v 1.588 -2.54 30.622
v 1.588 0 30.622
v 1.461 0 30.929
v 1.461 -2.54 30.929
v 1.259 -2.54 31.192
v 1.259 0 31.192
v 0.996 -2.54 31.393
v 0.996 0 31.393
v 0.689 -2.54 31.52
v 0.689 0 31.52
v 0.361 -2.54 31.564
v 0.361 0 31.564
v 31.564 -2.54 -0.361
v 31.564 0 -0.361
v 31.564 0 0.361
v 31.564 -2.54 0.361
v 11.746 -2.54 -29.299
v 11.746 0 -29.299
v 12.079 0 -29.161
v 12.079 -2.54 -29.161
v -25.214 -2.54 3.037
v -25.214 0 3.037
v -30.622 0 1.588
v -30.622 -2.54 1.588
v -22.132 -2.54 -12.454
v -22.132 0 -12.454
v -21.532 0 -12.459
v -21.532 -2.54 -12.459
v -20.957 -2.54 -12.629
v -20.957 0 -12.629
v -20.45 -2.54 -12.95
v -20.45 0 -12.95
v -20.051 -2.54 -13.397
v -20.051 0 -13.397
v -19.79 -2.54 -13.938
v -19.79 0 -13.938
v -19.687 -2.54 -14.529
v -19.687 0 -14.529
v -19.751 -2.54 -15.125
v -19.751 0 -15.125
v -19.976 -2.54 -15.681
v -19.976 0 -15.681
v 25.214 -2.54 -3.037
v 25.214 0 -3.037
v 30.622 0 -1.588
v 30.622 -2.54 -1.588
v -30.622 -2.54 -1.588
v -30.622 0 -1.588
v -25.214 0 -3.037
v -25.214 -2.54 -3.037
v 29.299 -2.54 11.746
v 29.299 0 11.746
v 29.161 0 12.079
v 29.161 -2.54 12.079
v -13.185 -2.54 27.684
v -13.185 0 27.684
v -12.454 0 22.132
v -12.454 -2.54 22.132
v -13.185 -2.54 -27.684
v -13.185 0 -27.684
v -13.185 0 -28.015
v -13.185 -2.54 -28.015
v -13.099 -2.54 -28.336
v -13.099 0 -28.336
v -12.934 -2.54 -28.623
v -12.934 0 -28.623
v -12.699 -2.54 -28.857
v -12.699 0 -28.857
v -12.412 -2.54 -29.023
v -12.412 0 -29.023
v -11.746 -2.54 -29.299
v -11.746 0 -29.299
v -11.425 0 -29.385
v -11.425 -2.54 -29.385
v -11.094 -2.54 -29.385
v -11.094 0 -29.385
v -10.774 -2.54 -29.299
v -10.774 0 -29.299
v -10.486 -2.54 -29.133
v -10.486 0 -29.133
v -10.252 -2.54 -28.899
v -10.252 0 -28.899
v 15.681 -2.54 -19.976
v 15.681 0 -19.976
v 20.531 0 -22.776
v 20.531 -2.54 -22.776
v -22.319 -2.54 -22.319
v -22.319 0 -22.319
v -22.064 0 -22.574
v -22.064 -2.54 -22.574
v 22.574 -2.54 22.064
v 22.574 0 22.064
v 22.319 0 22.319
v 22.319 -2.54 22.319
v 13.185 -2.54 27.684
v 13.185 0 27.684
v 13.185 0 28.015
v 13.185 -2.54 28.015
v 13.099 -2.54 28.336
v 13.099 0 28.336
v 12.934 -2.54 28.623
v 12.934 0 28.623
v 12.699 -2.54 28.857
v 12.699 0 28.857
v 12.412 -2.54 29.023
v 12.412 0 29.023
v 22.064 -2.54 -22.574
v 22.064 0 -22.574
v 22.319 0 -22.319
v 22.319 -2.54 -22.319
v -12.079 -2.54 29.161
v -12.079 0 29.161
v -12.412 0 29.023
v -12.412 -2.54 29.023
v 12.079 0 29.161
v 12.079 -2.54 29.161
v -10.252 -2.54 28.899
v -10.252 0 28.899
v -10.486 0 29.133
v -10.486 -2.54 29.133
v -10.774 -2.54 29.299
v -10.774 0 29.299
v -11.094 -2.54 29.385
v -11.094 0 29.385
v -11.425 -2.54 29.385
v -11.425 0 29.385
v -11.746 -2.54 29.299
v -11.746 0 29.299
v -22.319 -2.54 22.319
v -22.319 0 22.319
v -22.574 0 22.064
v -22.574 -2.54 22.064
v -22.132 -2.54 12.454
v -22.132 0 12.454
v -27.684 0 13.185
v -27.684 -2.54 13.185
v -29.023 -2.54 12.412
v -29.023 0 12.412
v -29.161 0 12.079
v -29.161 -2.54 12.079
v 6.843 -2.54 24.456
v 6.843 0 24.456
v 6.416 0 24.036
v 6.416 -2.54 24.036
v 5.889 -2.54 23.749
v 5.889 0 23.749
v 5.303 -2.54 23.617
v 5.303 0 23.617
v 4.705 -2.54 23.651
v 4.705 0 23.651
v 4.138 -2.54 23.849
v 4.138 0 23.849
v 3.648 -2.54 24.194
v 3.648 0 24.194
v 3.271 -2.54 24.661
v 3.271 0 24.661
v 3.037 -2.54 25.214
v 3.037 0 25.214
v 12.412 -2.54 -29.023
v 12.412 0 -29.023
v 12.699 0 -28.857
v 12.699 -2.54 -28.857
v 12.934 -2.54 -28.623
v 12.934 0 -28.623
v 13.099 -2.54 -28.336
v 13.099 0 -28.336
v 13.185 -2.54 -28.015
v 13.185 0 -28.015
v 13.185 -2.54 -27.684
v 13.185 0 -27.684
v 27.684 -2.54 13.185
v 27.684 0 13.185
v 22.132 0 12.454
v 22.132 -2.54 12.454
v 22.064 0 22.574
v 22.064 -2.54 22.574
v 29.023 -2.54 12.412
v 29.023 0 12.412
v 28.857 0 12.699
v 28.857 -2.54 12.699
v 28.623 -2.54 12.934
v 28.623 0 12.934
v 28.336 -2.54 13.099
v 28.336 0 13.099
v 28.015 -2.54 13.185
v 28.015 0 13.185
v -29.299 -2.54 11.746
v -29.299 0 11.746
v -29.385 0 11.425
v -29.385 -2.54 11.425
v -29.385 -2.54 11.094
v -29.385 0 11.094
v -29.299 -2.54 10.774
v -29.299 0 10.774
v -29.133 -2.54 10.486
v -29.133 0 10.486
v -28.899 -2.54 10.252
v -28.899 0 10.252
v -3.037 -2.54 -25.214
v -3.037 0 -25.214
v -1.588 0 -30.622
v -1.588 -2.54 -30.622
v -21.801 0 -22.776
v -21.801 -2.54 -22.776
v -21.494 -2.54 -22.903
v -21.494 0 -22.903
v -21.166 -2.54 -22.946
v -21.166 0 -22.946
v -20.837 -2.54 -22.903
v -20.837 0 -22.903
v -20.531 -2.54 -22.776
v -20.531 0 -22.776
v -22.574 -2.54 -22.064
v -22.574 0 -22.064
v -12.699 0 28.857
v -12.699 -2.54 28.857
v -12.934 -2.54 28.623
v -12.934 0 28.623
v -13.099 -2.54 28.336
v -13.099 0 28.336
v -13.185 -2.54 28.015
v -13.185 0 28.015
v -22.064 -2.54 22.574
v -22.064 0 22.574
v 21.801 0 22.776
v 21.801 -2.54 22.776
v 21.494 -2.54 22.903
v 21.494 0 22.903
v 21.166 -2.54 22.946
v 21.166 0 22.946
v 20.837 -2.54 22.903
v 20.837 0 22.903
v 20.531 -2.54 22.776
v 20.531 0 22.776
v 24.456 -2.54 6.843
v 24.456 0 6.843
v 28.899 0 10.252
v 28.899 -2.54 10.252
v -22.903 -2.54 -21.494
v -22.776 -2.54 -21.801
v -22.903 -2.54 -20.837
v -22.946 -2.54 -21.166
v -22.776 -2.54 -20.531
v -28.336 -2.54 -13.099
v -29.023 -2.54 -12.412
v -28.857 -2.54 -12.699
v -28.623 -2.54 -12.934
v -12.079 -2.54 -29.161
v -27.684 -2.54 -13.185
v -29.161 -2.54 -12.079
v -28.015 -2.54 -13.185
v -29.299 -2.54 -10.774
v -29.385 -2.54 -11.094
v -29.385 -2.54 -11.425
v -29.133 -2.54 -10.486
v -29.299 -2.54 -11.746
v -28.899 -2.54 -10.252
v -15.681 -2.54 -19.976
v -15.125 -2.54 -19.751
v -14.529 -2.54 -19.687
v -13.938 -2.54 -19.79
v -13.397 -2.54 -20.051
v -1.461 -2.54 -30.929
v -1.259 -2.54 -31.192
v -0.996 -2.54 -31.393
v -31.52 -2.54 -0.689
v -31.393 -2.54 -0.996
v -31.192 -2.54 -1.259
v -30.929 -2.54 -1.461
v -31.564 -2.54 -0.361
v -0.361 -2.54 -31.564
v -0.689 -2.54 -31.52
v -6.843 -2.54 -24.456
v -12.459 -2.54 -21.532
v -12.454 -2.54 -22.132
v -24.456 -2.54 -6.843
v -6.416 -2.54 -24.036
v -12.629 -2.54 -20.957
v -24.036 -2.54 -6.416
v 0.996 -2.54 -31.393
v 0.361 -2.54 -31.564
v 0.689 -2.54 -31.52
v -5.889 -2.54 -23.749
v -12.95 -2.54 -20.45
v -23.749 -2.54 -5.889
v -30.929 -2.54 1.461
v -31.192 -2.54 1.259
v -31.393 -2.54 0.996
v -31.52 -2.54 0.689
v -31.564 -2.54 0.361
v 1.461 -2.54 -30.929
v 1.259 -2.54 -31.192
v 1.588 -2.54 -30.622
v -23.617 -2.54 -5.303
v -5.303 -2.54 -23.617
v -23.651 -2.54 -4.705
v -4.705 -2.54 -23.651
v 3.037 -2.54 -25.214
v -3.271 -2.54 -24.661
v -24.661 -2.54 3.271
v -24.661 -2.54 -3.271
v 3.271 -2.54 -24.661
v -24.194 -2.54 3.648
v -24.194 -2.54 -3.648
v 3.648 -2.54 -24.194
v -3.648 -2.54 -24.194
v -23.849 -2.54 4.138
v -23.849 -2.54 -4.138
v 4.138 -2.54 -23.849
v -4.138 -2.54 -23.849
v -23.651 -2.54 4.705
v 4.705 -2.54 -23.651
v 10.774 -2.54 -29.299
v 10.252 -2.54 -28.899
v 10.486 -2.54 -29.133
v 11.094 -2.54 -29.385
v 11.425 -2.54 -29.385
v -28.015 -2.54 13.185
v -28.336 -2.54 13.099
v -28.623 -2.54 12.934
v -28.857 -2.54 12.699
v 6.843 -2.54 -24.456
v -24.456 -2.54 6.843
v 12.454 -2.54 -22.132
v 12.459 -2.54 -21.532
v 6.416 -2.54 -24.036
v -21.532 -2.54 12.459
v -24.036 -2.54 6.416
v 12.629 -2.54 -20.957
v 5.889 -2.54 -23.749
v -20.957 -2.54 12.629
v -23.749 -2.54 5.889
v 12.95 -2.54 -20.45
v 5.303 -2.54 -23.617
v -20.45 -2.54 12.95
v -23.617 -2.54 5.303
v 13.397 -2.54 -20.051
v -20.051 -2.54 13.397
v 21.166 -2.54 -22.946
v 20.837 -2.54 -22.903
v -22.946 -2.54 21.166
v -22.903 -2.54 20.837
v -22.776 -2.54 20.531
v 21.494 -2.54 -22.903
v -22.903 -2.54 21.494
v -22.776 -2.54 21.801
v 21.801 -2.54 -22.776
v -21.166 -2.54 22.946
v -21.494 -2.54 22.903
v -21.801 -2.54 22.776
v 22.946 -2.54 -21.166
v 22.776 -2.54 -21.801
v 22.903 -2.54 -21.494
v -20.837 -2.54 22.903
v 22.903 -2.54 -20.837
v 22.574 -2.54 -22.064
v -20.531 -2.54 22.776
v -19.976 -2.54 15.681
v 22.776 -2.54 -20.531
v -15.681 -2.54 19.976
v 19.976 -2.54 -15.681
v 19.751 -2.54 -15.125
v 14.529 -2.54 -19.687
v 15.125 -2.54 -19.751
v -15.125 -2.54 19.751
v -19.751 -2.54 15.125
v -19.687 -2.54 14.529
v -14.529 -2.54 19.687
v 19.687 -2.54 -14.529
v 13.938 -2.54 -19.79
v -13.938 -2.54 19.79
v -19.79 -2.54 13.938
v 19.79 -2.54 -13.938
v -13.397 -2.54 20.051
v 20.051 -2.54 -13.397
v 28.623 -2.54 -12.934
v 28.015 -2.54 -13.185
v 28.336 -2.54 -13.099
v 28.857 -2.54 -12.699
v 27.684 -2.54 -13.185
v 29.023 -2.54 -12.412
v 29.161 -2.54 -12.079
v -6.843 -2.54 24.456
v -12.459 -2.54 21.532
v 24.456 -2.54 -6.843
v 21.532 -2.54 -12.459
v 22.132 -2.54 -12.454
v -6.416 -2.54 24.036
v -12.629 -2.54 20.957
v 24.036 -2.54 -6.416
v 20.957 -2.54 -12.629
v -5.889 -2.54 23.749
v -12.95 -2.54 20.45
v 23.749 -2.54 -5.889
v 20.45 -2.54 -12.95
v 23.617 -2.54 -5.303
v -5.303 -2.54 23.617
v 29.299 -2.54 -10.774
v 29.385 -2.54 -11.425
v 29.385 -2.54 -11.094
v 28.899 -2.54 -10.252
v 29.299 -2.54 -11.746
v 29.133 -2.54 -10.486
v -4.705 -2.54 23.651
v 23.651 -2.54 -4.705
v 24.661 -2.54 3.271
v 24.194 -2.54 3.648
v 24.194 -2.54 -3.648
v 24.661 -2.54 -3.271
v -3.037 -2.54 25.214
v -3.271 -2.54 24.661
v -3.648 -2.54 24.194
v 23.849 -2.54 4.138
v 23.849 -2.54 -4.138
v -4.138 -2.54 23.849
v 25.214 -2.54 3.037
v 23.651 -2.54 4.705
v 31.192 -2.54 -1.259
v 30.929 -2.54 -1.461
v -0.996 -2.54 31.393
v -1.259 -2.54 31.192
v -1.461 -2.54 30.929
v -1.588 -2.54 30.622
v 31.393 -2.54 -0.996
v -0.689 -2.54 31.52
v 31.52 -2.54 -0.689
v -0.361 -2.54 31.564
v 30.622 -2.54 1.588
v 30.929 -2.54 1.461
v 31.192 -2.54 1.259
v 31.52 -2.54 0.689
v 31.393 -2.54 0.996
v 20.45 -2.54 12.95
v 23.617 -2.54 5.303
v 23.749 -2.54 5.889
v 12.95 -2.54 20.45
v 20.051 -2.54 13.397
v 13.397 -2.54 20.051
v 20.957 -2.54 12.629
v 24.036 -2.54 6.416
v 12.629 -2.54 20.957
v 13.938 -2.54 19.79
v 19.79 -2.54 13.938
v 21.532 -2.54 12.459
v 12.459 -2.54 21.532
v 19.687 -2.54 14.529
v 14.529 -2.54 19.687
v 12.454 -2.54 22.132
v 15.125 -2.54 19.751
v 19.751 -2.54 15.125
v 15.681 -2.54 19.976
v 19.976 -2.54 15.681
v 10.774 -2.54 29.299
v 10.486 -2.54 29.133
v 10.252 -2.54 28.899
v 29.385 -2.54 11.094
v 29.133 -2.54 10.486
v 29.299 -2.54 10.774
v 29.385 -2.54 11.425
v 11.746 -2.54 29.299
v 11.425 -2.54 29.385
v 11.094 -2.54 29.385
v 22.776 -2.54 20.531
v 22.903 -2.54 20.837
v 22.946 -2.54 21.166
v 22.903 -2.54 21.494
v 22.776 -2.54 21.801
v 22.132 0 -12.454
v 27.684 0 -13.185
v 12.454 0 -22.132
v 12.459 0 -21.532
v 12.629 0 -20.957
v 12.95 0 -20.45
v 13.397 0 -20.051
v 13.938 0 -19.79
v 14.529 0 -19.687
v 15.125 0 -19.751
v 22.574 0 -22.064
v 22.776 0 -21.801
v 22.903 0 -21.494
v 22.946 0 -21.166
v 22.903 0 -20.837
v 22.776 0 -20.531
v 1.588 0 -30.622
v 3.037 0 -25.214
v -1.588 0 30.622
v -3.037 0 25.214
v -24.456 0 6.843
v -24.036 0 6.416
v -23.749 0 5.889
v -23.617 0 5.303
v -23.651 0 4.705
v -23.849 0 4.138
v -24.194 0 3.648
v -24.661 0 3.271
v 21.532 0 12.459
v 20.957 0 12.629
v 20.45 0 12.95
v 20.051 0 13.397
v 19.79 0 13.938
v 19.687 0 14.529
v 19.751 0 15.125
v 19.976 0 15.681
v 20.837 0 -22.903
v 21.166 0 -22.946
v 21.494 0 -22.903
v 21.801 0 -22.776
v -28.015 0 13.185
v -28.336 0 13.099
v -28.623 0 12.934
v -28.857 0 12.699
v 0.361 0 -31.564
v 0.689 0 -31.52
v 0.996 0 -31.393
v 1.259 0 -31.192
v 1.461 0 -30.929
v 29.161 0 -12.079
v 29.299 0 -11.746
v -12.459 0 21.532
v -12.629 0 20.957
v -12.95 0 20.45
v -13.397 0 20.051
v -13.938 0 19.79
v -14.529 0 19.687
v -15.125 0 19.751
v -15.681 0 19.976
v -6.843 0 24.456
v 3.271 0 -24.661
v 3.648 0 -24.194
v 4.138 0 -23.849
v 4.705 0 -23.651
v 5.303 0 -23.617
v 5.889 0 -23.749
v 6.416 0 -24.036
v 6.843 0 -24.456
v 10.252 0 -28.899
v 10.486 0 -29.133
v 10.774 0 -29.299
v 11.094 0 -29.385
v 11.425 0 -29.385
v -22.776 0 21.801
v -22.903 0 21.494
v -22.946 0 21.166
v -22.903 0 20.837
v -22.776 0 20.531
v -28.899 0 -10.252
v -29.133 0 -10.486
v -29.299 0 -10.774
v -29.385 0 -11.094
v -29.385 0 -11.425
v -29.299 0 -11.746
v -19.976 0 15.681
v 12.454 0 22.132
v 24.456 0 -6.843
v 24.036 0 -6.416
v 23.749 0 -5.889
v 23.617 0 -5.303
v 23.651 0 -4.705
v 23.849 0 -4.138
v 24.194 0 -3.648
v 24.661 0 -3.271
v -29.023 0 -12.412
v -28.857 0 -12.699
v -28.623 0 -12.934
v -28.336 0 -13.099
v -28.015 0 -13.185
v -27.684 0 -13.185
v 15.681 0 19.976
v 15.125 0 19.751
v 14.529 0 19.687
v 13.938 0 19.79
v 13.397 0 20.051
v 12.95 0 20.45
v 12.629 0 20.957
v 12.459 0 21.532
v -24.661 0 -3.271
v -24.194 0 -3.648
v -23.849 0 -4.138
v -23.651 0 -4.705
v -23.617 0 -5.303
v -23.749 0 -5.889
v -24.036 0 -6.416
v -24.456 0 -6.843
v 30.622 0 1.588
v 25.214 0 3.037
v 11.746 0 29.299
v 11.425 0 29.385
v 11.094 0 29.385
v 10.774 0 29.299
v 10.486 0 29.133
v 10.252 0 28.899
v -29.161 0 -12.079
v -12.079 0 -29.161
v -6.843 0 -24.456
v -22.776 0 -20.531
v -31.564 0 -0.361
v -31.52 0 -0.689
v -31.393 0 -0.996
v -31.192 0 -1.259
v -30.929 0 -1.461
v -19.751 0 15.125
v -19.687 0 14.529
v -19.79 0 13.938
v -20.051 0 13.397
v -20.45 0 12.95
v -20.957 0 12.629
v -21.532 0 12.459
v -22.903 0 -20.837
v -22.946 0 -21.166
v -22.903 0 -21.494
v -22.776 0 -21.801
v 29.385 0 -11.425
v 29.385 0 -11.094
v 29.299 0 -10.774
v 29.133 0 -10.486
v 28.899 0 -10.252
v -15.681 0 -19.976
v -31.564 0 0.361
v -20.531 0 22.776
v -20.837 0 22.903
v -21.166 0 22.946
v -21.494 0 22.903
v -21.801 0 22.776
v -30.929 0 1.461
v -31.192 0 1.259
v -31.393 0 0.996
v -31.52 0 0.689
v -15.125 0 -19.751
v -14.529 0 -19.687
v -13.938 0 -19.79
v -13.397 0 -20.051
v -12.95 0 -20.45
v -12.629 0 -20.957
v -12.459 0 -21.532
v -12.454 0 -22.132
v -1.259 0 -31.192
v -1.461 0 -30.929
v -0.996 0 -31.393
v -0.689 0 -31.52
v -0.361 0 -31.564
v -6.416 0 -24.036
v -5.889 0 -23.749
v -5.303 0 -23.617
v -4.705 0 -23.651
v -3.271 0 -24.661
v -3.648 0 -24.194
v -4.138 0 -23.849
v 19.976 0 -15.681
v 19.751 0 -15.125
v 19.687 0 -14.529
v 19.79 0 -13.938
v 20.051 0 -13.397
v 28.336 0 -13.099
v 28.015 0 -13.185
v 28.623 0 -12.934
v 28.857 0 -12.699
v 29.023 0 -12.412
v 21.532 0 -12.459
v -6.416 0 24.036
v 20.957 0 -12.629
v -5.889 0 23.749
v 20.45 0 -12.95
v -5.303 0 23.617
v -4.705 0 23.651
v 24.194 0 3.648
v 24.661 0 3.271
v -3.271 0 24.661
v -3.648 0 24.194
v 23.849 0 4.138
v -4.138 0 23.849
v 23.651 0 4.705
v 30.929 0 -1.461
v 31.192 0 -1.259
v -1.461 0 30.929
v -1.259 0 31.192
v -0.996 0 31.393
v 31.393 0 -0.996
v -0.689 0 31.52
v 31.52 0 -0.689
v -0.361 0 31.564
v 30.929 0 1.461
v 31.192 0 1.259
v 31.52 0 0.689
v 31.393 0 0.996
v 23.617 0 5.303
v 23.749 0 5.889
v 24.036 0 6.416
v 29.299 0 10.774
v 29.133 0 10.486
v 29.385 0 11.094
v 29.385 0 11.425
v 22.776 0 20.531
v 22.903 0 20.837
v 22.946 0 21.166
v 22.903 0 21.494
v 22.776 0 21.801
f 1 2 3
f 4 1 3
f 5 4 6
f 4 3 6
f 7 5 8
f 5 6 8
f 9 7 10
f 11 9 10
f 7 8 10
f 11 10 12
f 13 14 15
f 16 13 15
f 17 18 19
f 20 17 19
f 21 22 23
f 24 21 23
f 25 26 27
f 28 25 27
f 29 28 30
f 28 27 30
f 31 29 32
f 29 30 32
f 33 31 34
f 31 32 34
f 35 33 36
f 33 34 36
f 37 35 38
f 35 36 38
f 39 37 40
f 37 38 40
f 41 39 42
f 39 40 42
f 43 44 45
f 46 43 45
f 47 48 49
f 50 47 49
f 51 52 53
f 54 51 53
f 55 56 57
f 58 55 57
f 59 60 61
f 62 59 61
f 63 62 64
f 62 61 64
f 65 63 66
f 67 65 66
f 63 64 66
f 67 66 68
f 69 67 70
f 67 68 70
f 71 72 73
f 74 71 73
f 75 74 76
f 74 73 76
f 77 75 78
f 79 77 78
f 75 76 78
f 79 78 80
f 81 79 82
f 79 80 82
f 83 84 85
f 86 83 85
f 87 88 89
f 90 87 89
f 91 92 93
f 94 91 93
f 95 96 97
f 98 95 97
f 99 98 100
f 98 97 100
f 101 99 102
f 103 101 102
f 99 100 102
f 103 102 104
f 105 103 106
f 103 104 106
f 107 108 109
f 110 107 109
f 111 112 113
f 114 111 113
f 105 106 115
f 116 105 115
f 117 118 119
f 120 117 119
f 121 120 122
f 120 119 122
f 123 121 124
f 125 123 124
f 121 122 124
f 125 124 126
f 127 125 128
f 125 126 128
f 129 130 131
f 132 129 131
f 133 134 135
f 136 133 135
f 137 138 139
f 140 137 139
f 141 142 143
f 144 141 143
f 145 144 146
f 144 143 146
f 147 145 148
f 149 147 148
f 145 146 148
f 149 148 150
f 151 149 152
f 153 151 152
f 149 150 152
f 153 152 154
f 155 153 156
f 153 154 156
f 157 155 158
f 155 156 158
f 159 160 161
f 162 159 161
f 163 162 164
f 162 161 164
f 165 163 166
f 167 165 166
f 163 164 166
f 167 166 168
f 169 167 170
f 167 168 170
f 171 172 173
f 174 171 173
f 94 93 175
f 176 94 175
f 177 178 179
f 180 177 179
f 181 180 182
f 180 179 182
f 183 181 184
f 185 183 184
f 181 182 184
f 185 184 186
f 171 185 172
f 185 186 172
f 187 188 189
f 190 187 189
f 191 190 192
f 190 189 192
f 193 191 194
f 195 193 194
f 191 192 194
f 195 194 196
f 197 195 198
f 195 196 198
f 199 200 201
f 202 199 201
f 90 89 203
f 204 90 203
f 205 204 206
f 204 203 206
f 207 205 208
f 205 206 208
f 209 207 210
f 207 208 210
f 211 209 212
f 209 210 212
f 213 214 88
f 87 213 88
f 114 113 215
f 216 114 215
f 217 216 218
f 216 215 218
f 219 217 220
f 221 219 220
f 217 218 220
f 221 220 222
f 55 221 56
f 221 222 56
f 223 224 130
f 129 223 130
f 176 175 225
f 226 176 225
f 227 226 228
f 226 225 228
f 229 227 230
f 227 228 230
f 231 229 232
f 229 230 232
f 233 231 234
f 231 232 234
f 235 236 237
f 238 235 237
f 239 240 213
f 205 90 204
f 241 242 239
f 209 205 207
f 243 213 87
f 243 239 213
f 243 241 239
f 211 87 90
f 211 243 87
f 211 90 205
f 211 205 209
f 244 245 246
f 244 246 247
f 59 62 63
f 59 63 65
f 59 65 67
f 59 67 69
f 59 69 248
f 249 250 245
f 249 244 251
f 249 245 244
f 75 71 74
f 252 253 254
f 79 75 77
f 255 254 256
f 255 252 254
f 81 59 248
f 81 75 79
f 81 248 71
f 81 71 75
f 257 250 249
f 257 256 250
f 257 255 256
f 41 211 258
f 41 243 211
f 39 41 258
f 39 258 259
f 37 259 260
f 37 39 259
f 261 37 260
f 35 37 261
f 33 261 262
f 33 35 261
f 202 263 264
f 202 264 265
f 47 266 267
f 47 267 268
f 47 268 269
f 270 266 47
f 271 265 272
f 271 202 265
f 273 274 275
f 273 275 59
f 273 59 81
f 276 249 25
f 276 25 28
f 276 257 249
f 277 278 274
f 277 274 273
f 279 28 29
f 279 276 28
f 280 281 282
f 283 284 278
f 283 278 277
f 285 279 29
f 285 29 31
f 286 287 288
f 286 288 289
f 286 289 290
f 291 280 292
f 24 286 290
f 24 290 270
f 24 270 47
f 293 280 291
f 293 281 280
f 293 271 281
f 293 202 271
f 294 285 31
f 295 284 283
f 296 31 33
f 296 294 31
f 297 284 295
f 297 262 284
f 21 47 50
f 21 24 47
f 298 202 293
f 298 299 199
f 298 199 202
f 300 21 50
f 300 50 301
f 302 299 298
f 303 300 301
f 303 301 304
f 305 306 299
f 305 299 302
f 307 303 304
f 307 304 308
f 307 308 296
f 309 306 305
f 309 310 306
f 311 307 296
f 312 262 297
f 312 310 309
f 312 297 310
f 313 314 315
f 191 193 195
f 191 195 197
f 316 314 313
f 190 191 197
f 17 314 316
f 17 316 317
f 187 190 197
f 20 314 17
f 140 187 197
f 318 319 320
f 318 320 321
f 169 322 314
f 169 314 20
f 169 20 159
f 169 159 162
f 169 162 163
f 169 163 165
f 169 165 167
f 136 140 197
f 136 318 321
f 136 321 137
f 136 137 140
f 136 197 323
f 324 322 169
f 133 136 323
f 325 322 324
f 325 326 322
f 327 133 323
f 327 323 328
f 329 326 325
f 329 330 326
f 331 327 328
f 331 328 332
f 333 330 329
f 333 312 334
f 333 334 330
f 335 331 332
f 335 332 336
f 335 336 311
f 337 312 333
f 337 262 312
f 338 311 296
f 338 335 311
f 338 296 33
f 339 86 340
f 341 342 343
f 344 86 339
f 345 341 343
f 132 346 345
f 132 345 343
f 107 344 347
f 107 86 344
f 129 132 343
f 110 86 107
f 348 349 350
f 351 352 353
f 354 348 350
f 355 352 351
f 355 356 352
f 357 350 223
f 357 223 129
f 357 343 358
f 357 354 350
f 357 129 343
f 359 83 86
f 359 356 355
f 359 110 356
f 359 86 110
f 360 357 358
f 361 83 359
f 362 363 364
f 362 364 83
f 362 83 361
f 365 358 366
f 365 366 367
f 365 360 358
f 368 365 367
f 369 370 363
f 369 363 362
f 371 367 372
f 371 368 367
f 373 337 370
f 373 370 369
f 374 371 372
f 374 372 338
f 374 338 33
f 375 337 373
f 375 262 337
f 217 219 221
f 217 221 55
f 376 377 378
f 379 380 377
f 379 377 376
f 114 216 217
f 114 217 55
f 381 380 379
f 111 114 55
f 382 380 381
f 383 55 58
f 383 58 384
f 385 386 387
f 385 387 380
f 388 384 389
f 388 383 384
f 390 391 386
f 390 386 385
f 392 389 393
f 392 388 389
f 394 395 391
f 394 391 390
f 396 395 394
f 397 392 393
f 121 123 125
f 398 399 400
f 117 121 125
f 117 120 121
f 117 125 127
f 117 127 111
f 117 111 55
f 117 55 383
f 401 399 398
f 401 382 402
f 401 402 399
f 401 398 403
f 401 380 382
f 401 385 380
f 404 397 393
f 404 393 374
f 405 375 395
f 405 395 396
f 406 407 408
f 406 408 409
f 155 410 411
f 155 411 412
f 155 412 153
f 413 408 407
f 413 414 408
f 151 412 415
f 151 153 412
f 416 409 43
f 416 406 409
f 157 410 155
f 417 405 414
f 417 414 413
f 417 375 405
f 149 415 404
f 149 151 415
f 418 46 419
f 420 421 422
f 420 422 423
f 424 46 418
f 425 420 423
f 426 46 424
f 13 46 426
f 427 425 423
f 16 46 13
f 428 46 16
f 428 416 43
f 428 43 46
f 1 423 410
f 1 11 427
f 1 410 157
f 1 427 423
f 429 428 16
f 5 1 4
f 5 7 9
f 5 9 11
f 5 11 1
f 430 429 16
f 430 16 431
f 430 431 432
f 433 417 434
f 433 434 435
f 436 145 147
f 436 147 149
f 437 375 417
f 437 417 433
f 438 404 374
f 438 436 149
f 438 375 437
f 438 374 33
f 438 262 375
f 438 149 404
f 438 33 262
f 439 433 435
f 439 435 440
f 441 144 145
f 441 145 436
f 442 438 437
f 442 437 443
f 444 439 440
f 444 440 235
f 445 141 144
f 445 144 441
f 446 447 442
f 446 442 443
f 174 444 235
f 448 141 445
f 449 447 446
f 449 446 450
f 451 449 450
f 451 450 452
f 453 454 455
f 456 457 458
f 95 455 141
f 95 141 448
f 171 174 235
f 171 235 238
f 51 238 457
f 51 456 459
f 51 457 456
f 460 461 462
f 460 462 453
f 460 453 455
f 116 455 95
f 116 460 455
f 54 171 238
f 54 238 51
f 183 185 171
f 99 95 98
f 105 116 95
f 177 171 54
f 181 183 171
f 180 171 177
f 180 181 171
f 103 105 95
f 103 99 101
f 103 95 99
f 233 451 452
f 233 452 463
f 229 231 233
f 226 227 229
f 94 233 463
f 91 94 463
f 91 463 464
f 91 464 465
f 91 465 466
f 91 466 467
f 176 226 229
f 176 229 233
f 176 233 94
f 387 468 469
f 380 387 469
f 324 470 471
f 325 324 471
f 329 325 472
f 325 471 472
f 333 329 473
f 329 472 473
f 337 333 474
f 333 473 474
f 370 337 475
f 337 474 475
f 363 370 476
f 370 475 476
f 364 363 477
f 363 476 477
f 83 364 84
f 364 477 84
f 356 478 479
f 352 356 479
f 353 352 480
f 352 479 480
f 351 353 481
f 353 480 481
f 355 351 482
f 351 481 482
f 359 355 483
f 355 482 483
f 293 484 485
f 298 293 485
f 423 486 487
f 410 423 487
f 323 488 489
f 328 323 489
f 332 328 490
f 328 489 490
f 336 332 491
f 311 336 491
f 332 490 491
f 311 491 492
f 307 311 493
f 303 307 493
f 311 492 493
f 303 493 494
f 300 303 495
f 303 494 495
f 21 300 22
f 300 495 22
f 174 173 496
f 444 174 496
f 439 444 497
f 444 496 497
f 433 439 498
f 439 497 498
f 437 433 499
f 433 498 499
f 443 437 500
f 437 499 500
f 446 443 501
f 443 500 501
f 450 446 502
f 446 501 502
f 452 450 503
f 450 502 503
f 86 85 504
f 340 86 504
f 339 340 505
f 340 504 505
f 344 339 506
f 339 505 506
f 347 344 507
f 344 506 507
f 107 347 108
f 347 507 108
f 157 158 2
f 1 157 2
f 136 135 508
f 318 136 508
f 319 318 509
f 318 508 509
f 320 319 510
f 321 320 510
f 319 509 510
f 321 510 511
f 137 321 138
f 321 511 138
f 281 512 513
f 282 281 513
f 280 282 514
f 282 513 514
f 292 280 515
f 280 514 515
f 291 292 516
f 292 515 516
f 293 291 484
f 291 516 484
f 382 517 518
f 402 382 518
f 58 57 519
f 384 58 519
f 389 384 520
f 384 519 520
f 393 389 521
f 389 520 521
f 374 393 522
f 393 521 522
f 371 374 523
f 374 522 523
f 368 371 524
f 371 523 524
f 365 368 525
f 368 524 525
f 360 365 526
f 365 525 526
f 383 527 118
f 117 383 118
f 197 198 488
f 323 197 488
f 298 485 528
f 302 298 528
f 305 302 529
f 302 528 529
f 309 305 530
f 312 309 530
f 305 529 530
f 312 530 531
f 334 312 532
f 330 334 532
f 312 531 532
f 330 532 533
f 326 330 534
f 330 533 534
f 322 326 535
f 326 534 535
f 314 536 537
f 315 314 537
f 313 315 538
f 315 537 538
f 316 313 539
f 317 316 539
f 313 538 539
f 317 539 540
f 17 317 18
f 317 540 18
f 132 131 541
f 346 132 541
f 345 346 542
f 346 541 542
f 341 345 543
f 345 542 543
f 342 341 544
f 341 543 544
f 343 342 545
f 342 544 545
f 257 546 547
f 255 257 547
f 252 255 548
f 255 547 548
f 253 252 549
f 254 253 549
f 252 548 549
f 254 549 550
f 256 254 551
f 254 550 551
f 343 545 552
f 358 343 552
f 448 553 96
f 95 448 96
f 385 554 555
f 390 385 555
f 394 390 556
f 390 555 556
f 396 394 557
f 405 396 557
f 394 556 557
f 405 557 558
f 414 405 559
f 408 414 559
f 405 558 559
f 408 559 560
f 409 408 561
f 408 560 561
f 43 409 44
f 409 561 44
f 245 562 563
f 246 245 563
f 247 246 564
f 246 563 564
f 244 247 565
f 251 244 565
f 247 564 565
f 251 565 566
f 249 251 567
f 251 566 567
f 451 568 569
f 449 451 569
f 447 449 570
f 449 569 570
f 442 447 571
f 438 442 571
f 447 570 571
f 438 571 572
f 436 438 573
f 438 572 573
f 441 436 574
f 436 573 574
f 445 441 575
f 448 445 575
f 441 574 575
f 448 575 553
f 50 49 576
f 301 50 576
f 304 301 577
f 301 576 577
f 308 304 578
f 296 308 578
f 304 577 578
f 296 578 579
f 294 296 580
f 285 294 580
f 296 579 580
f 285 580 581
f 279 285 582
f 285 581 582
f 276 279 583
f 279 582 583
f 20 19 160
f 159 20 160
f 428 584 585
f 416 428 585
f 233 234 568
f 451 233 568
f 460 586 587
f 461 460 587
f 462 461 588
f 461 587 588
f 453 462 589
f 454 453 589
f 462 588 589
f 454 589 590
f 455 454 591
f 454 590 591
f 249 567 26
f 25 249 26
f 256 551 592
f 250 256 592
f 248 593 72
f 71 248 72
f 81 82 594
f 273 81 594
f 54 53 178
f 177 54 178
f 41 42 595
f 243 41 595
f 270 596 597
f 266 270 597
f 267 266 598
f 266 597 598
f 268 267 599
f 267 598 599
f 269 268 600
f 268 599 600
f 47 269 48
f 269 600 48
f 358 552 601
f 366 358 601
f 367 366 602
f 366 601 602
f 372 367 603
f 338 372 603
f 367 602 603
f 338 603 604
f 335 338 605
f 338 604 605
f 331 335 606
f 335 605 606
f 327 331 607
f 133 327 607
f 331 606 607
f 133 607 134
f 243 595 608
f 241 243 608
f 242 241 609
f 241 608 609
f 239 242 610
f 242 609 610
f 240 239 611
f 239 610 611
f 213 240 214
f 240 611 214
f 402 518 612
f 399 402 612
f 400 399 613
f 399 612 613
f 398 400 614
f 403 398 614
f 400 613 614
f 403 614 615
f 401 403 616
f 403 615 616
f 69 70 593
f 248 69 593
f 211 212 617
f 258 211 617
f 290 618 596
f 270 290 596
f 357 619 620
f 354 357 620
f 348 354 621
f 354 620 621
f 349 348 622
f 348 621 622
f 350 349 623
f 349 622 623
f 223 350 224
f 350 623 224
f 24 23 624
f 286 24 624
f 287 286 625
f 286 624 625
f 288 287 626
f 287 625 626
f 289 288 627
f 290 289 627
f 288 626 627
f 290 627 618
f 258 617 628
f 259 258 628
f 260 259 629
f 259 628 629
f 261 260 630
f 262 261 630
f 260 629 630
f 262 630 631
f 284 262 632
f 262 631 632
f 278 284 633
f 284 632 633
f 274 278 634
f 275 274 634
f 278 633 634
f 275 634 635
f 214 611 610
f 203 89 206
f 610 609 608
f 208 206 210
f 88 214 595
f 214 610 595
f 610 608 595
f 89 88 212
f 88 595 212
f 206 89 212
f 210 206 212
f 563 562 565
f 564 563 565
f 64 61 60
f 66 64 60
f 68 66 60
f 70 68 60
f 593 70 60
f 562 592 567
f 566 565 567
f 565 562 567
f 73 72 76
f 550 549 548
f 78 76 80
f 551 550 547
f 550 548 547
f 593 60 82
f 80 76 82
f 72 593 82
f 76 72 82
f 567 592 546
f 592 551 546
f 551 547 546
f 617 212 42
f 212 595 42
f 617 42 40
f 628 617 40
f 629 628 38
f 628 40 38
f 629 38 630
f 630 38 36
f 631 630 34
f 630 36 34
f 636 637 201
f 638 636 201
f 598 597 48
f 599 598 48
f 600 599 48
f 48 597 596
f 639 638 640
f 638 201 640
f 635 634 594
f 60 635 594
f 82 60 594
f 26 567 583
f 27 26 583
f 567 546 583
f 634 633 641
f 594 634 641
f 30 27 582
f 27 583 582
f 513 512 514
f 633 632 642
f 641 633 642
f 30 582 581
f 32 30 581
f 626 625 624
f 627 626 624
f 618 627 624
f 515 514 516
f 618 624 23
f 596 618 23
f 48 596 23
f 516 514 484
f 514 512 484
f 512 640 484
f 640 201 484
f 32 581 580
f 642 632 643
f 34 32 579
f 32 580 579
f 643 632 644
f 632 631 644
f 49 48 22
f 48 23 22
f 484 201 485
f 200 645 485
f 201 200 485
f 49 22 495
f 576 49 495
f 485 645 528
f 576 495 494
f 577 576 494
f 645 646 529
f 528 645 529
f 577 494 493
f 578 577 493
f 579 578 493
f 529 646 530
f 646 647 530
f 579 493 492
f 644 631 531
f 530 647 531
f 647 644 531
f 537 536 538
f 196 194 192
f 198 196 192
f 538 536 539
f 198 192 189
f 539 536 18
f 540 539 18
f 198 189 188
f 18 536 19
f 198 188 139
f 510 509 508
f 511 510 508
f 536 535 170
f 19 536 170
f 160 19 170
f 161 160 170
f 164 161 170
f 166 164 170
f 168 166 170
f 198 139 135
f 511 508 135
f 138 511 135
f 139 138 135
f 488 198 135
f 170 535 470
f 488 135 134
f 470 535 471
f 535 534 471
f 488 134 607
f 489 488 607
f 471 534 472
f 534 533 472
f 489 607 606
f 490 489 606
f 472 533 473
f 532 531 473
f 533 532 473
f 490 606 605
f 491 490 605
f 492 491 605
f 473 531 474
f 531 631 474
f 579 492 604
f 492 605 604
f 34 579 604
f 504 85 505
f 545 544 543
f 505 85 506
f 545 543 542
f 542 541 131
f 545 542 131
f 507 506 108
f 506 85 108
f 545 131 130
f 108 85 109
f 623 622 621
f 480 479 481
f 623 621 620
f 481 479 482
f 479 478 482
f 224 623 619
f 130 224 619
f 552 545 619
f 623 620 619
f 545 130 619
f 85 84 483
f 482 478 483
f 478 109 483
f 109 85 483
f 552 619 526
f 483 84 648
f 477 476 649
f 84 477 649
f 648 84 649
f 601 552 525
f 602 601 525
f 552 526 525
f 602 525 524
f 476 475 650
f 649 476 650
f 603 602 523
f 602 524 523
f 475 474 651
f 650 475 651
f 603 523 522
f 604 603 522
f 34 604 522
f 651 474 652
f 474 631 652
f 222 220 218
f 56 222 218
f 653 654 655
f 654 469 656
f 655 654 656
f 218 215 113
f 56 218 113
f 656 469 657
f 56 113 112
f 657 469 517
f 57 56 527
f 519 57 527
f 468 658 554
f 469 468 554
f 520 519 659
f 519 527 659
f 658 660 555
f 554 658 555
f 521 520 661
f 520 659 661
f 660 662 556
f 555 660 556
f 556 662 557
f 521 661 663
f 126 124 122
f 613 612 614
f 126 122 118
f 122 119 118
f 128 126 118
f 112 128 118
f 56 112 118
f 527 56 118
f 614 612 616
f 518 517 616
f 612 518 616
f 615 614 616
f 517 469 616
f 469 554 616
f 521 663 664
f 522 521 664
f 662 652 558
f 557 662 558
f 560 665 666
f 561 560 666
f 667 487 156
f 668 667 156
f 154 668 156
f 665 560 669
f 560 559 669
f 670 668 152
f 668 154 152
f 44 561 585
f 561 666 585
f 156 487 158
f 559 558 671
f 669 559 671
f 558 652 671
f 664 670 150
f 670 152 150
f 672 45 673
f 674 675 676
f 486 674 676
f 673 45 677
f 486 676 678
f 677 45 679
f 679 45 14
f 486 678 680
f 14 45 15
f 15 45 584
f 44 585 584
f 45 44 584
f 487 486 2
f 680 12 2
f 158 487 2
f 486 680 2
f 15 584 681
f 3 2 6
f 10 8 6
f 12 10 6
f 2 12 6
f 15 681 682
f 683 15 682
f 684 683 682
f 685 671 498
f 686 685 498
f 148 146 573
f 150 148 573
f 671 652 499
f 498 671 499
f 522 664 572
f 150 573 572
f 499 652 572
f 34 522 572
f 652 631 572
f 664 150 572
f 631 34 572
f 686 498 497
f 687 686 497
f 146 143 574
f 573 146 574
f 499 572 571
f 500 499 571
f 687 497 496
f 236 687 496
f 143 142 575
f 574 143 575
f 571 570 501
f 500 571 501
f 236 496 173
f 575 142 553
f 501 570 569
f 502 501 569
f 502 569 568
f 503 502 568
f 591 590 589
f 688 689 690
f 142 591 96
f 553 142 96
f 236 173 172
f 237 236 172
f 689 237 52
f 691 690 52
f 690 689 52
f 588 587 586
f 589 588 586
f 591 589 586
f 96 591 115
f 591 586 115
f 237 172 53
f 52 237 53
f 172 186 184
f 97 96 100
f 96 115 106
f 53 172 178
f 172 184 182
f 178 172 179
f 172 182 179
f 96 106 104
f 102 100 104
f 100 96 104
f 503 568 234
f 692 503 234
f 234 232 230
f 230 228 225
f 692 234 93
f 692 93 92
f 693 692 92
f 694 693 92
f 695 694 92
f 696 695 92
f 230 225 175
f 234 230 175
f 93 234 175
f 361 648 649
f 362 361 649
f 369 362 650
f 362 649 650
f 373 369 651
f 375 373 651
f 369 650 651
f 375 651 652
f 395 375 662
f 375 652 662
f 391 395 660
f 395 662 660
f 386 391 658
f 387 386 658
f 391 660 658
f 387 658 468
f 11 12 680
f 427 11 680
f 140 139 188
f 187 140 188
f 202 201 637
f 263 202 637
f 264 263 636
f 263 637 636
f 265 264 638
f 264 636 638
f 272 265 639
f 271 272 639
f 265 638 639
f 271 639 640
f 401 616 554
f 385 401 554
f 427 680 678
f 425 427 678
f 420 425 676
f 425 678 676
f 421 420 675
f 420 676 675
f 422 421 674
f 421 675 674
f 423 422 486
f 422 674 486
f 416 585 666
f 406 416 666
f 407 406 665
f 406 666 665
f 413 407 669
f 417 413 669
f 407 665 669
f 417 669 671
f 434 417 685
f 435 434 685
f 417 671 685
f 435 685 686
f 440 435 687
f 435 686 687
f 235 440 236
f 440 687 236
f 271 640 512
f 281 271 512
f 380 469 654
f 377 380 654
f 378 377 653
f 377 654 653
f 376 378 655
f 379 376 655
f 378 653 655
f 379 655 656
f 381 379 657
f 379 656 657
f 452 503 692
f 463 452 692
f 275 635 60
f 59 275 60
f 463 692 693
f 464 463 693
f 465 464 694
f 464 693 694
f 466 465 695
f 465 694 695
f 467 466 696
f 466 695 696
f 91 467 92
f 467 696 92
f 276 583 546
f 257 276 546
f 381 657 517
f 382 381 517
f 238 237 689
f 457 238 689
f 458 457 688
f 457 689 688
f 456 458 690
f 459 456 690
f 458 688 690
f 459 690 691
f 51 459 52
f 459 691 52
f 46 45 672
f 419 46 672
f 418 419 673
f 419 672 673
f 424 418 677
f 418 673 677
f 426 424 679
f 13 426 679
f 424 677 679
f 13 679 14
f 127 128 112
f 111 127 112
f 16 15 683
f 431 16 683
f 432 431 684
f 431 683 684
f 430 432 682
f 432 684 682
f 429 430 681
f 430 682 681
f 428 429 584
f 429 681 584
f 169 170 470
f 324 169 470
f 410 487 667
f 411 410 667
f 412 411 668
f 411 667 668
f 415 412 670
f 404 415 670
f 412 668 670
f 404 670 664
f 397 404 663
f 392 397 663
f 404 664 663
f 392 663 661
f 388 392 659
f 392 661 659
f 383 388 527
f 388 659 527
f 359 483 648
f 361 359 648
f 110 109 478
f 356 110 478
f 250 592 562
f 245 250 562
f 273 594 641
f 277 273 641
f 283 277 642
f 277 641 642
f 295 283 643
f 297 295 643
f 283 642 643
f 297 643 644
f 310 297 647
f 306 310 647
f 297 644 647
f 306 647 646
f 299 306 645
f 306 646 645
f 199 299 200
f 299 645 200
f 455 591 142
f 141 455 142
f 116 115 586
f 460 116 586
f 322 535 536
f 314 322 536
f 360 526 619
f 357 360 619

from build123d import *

# Parameters (mm, degrees)
F1_DEPTH = 2.54


with BuildPart() as f1:
    # F0 (on Front) → F1 (new body)
    with BuildSketch(Plane.XZ):
        with BuildLine():
            Line((-1.5875, 30.622215), (-3.036757, 25.213515))
            ThreePointArc((-3.036757, 25.213515), (-4.704564, 23.651443), (-6.843197, 24.456367))
            Line((-6.843197, 24.456367), (-10.251956, 28.898748))
            ThreePointArc((-10.251956, 28.898748), (-10.930814, 29.352346), (-11.745522, 29.298948))
            Line((-11.745522, 29.298948), (-12.078834, 29.160885))
            Line((-12.078834, 29.160885), (-12.412146, 29.022823))
            ThreePointArc((-12.412146, 29.022823), (-13.02599, 28.484496), (-13.185273, 27.683728))
            Line((-13.185273, 27.683728), (-12.454392, 22.132134))
            ThreePointArc((-12.454392, 22.132134), (-13.397466, 20.050725), (-15.681336, 19.975959))
            Line((-15.681336, 19.975959), (-20.530644, 22.775708))
            ThreePointArc((-20.530644, 22.775708), (-21.331412, 22.934991), (-22.06367, 22.573881))
            Line((-22.06367, 22.573881), (-22.318775, 22.318775))
            Line((-22.318775, 22.318775), (-22.573881, 22.06367))
            ThreePointArc((-22.573881, 22.06367), (-22.934991, 21.331412), (-22.775708, 20.530644))
            Line((-22.775708, 20.530644), (-19.975959, 15.681336))
            ThreePointArc((-19.975959, 15.681336), (-20.050725, 13.397466), (-22.132134, 12.454392))
            Line((-22.132134, 12.454392), (-27.683728, 13.185273))
            ThreePointArc((-27.683728, 13.185273), (-28.484496, 13.02599), (-29.022823, 12.412146))
            Line((-29.022823, 12.412146), (-29.160885, 12.078834))
            Line((-29.160885, 12.078834), (-29.298948, 11.745522))
            ThreePointArc((-29.298948, 11.745522), (-29.352346, 10.930814), (-28.898748, 10.251956))
            Line((-28.898748, 10.251956), (-24.456367, 6.843197))
            ThreePointArc((-24.456367, 6.843197), (-23.651443, 4.704564), (-25.213515, 3.036757))
            Line((-25.213515, 3.036757), (-30.622215, 1.5875))
            ThreePointArc((-30.622215, 1.5875), (-31.301074, 1.133901), (-31.563515, 0.360774))
            Line((-31.563515, 0.360774), (-31.563515, 0))
            Line((-31.563515, 0), (-31.563515, -0.360774))
            ThreePointArc((-31.563515, -0.360774), (-31.301074, -1.133901), (-30.622215, -1.5875))
            Line((-30.622215, -1.5875), (-25.213515, -3.036757))
            ThreePointArc((-25.213515, -3.036757), (-23.651443, -4.704564), (-24.456367, -6.843197))
            Line((-24.456367, -6.843197), (-28.898748, -10.251956))
            ThreePointArc((-28.898748, -10.251956), (-29.352346, -10.930814), (-29.298948, -11.745522))
            Line((-29.298948, -11.745522), (-29.160885, -12.078834))
            Line((-29.160885, -12.078834), (-29.022823, -12.412146))
            ThreePointArc((-29.022823, -12.412146), (-28.484496, -13.02599), (-27.683728, -13.185273))
            Line((-27.683728, -13.185273), (-22.132134, -12.454392))
            ThreePointArc((-22.132134, -12.454392), (-20.050725, -13.397466), (-19.975959, -15.681336))
            Line((-19.975959, -15.681336), (-22.775708, -20.530644))
            ThreePointArc((-22.775708, -20.530644), (-22.934991, -21.331412), (-22.573881, -22.06367))
            Line((-22.573881, -22.06367), (-22.318775, -22.318775))
            Line((-22.318775, -22.318775), (-22.06367, -22.573881))
            ThreePointArc((-22.06367, -22.573881), (-21.331412, -22.934991), (-20.530644, -22.775708))
            Line((-20.530644, -22.775708), (-15.681336, -19.975959))
            ThreePointArc((-15.681336, -19.975959), (-13.397466, -20.050725), (-12.454392, -22.132134))
            Line((-12.454392, -22.132134), (-13.185273, -27.683728))
            ThreePointArc((-13.185273, -27.683728), (-13.02599, -28.484496), (-12.412146, -29.022823))
            Line((-12.412146, -29.022823), (-12.078834, -29.160885))
            Line((-12.078834, -29.160885), (-11.745522, -29.298948))
            ThreePointArc((-11.745522, -29.298948), (-10.930814, -29.352346), (-10.251956, -28.898748))
            Line((-10.251956, -28.898748), (-6.843197, -24.456367))
            ThreePointArc((-6.843197, -24.456367), (-4.704564, -23.651443), (-3.036757, -25.213515))
            Line((-3.036757, -25.213515), (-1.5875, -30.622215))
            ThreePointArc((-1.5875, -30.622215), (-1.133901, -31.301074), (-0.360774, -31.563515))
            Line((-0.360774, -31.563515), (0, -31.563515))
            Line((0, -31.563515), (0.360774, -31.563515))
            ThreePointArc((0.360774, -31.563515), (1.133901, -31.301074), (1.5875, -30.622215))
            Line((1.5875, -30.622215), (3.036757, -25.213515))
            ThreePointArc((3.036757, -25.213515), (4.704564, -23.651443), (6.843197, -24.456367))
            Line((6.843197, -24.456367), (10.251956, -28.898748))
            ThreePointArc((10.251956, -28.898748), (10.930814, -29.352346), (11.745522, -29.298948))
            Line((11.745522, -29.298948), (12.078834, -29.160885))
            Line((12.078834, -29.160885), (12.412146, -29.022823))
            ThreePointArc((12.412146, -29.022823), (13.02599, -28.484496), (13.185273, -27.683728))
            Line((13.185273, -27.683728), (12.454392, -22.132134))
            ThreePointArc((12.454392, -22.132134), (13.397466, -20.050725), (15.681336, -19.975959))
            Line((15.681336, -19.975959), (20.530644, -22.775708))
            ThreePointArc((20.530644, -22.775708), (21.331412, -22.934991), (22.06367, -22.573881))
            Line((22.06367, -22.573881), (22.318775, -22.318775))
            Line((22.318775, -22.318775), (22.573881, -22.06367))
            ThreePointArc((22.573881, -22.06367), (22.934991, -21.331412), (22.775708, -20.530644))
            Line((22.775708, -20.530644), (19.975959, -15.681336))
            ThreePointArc((19.975959, -15.681336), (20.050725, -13.397466), (22.132134, -12.454392))
            Line((22.132134, -12.454392), (27.683728, -13.185273))
            ThreePointArc((27.683728, -13.185273), (28.484496, -13.02599), (29.022823, -12.412146))
            Line((29.022823, -12.412146), (29.160885, -12.078834))
            Line((29.160885, -12.078834), (29.298948, -11.745522))
            ThreePointArc((29.298948, -11.745522), (29.352346, -10.930814), (28.898748, -10.251956))
            Line((28.898748, -10.251956), (24.456367, -6.843197))
            ThreePointArc((24.456367, -6.843197), (23.651443, -4.704564), (25.213515, -3.036757))
            Line((25.213515, -3.036757), (30.622215, -1.5875))
            ThreePointArc((30.622215, -1.5875), (31.301074, -1.133901), (31.563515, -0.360774))
            Line((31.563515, -0.360774), (31.563515, 0))
            Line((31.563515, 0), (31.563515, 0.360774))
            ThreePointArc((31.563515, 0.360774), (31.301074, 1.133901), (30.622215, 1.5875))
            Line((30.622215, 1.5875), (25.213515, 3.036757))
            ThreePointArc((25.213515, 3.036757), (23.651443, 4.704564), (24.456367, 6.843197))
            Line((24.456367, 6.843197), (28.898748, 10.251956))
            ThreePointArc((28.898748, 10.251956), (29.352346, 10.930814), (29.298948, 11.745522))
            Line((29.298948, 11.745522), (29.160885, 12.078834))
            Line((29.160885, 12.078834), (29.022823, 12.412146))
            ThreePointArc((29.022823, 12.412146), (28.484496, 13.02599), (27.683728, 13.185273))
            Line((27.683728, 13.185273), (22.132134, 12.454392))
            ThreePointArc((22.132134, 12.454392), (20.050725, 13.397466), (19.975959, 15.681336))
            Line((19.975959, 15.681336), (22.775708, 20.530644))
            ThreePointArc((22.775708, 20.530644), (22.934991, 21.331412), (22.573881, 22.06367))
            Line((22.573881, 22.06367), (22.318775, 22.318775))
            Line((22.318775, 22.318775), (22.06367, 22.573881))
            ThreePointArc((22.06367, 22.573881), (21.331412, 22.934991), (20.530644, 22.775708))
            Line((20.530644, 22.775708), (15.681336, 19.975959))
            ThreePointArc((15.681336, 19.975959), (13.397466, 20.050725), (12.454392, 22.132134))
            Line((12.454392, 22.132134), (13.185273, 27.683728))
            ThreePointArc((13.185273, 27.683728), (13.02599, 28.484496), (12.412146, 29.022823))
            Line((12.412146, 29.022823), (12.078834, 29.160885))
            Line((12.078834, 29.160885), (11.745522, 29.298948))
            ThreePointArc((11.745522, 29.298948), (10.930814, 29.352346), (10.251956, 28.898748))
            Line((10.251956, 28.898748), (6.843197, 24.456367))
            ThreePointArc((6.843197, 24.456367), (4.704564, 23.651443), (3.036757, 25.213515))
            Line((3.036757, 25.213515), (1.5875, 30.622215))
            ThreePointArc((1.5875, 30.622215), (1.133901, 31.301074), (0.360774, 31.563515))
            Line((0.360774, 31.563515), (0, 31.563515))
            Line((0, 31.563515), (-0.360774, 31.563515))
            ThreePointArc((-0.360774, 31.563515), (-1.133901, 31.301074), (-1.5875, 30.622215))
        make_face()
    extrude(amount=F1_DEPTH)


solid = f1.part
